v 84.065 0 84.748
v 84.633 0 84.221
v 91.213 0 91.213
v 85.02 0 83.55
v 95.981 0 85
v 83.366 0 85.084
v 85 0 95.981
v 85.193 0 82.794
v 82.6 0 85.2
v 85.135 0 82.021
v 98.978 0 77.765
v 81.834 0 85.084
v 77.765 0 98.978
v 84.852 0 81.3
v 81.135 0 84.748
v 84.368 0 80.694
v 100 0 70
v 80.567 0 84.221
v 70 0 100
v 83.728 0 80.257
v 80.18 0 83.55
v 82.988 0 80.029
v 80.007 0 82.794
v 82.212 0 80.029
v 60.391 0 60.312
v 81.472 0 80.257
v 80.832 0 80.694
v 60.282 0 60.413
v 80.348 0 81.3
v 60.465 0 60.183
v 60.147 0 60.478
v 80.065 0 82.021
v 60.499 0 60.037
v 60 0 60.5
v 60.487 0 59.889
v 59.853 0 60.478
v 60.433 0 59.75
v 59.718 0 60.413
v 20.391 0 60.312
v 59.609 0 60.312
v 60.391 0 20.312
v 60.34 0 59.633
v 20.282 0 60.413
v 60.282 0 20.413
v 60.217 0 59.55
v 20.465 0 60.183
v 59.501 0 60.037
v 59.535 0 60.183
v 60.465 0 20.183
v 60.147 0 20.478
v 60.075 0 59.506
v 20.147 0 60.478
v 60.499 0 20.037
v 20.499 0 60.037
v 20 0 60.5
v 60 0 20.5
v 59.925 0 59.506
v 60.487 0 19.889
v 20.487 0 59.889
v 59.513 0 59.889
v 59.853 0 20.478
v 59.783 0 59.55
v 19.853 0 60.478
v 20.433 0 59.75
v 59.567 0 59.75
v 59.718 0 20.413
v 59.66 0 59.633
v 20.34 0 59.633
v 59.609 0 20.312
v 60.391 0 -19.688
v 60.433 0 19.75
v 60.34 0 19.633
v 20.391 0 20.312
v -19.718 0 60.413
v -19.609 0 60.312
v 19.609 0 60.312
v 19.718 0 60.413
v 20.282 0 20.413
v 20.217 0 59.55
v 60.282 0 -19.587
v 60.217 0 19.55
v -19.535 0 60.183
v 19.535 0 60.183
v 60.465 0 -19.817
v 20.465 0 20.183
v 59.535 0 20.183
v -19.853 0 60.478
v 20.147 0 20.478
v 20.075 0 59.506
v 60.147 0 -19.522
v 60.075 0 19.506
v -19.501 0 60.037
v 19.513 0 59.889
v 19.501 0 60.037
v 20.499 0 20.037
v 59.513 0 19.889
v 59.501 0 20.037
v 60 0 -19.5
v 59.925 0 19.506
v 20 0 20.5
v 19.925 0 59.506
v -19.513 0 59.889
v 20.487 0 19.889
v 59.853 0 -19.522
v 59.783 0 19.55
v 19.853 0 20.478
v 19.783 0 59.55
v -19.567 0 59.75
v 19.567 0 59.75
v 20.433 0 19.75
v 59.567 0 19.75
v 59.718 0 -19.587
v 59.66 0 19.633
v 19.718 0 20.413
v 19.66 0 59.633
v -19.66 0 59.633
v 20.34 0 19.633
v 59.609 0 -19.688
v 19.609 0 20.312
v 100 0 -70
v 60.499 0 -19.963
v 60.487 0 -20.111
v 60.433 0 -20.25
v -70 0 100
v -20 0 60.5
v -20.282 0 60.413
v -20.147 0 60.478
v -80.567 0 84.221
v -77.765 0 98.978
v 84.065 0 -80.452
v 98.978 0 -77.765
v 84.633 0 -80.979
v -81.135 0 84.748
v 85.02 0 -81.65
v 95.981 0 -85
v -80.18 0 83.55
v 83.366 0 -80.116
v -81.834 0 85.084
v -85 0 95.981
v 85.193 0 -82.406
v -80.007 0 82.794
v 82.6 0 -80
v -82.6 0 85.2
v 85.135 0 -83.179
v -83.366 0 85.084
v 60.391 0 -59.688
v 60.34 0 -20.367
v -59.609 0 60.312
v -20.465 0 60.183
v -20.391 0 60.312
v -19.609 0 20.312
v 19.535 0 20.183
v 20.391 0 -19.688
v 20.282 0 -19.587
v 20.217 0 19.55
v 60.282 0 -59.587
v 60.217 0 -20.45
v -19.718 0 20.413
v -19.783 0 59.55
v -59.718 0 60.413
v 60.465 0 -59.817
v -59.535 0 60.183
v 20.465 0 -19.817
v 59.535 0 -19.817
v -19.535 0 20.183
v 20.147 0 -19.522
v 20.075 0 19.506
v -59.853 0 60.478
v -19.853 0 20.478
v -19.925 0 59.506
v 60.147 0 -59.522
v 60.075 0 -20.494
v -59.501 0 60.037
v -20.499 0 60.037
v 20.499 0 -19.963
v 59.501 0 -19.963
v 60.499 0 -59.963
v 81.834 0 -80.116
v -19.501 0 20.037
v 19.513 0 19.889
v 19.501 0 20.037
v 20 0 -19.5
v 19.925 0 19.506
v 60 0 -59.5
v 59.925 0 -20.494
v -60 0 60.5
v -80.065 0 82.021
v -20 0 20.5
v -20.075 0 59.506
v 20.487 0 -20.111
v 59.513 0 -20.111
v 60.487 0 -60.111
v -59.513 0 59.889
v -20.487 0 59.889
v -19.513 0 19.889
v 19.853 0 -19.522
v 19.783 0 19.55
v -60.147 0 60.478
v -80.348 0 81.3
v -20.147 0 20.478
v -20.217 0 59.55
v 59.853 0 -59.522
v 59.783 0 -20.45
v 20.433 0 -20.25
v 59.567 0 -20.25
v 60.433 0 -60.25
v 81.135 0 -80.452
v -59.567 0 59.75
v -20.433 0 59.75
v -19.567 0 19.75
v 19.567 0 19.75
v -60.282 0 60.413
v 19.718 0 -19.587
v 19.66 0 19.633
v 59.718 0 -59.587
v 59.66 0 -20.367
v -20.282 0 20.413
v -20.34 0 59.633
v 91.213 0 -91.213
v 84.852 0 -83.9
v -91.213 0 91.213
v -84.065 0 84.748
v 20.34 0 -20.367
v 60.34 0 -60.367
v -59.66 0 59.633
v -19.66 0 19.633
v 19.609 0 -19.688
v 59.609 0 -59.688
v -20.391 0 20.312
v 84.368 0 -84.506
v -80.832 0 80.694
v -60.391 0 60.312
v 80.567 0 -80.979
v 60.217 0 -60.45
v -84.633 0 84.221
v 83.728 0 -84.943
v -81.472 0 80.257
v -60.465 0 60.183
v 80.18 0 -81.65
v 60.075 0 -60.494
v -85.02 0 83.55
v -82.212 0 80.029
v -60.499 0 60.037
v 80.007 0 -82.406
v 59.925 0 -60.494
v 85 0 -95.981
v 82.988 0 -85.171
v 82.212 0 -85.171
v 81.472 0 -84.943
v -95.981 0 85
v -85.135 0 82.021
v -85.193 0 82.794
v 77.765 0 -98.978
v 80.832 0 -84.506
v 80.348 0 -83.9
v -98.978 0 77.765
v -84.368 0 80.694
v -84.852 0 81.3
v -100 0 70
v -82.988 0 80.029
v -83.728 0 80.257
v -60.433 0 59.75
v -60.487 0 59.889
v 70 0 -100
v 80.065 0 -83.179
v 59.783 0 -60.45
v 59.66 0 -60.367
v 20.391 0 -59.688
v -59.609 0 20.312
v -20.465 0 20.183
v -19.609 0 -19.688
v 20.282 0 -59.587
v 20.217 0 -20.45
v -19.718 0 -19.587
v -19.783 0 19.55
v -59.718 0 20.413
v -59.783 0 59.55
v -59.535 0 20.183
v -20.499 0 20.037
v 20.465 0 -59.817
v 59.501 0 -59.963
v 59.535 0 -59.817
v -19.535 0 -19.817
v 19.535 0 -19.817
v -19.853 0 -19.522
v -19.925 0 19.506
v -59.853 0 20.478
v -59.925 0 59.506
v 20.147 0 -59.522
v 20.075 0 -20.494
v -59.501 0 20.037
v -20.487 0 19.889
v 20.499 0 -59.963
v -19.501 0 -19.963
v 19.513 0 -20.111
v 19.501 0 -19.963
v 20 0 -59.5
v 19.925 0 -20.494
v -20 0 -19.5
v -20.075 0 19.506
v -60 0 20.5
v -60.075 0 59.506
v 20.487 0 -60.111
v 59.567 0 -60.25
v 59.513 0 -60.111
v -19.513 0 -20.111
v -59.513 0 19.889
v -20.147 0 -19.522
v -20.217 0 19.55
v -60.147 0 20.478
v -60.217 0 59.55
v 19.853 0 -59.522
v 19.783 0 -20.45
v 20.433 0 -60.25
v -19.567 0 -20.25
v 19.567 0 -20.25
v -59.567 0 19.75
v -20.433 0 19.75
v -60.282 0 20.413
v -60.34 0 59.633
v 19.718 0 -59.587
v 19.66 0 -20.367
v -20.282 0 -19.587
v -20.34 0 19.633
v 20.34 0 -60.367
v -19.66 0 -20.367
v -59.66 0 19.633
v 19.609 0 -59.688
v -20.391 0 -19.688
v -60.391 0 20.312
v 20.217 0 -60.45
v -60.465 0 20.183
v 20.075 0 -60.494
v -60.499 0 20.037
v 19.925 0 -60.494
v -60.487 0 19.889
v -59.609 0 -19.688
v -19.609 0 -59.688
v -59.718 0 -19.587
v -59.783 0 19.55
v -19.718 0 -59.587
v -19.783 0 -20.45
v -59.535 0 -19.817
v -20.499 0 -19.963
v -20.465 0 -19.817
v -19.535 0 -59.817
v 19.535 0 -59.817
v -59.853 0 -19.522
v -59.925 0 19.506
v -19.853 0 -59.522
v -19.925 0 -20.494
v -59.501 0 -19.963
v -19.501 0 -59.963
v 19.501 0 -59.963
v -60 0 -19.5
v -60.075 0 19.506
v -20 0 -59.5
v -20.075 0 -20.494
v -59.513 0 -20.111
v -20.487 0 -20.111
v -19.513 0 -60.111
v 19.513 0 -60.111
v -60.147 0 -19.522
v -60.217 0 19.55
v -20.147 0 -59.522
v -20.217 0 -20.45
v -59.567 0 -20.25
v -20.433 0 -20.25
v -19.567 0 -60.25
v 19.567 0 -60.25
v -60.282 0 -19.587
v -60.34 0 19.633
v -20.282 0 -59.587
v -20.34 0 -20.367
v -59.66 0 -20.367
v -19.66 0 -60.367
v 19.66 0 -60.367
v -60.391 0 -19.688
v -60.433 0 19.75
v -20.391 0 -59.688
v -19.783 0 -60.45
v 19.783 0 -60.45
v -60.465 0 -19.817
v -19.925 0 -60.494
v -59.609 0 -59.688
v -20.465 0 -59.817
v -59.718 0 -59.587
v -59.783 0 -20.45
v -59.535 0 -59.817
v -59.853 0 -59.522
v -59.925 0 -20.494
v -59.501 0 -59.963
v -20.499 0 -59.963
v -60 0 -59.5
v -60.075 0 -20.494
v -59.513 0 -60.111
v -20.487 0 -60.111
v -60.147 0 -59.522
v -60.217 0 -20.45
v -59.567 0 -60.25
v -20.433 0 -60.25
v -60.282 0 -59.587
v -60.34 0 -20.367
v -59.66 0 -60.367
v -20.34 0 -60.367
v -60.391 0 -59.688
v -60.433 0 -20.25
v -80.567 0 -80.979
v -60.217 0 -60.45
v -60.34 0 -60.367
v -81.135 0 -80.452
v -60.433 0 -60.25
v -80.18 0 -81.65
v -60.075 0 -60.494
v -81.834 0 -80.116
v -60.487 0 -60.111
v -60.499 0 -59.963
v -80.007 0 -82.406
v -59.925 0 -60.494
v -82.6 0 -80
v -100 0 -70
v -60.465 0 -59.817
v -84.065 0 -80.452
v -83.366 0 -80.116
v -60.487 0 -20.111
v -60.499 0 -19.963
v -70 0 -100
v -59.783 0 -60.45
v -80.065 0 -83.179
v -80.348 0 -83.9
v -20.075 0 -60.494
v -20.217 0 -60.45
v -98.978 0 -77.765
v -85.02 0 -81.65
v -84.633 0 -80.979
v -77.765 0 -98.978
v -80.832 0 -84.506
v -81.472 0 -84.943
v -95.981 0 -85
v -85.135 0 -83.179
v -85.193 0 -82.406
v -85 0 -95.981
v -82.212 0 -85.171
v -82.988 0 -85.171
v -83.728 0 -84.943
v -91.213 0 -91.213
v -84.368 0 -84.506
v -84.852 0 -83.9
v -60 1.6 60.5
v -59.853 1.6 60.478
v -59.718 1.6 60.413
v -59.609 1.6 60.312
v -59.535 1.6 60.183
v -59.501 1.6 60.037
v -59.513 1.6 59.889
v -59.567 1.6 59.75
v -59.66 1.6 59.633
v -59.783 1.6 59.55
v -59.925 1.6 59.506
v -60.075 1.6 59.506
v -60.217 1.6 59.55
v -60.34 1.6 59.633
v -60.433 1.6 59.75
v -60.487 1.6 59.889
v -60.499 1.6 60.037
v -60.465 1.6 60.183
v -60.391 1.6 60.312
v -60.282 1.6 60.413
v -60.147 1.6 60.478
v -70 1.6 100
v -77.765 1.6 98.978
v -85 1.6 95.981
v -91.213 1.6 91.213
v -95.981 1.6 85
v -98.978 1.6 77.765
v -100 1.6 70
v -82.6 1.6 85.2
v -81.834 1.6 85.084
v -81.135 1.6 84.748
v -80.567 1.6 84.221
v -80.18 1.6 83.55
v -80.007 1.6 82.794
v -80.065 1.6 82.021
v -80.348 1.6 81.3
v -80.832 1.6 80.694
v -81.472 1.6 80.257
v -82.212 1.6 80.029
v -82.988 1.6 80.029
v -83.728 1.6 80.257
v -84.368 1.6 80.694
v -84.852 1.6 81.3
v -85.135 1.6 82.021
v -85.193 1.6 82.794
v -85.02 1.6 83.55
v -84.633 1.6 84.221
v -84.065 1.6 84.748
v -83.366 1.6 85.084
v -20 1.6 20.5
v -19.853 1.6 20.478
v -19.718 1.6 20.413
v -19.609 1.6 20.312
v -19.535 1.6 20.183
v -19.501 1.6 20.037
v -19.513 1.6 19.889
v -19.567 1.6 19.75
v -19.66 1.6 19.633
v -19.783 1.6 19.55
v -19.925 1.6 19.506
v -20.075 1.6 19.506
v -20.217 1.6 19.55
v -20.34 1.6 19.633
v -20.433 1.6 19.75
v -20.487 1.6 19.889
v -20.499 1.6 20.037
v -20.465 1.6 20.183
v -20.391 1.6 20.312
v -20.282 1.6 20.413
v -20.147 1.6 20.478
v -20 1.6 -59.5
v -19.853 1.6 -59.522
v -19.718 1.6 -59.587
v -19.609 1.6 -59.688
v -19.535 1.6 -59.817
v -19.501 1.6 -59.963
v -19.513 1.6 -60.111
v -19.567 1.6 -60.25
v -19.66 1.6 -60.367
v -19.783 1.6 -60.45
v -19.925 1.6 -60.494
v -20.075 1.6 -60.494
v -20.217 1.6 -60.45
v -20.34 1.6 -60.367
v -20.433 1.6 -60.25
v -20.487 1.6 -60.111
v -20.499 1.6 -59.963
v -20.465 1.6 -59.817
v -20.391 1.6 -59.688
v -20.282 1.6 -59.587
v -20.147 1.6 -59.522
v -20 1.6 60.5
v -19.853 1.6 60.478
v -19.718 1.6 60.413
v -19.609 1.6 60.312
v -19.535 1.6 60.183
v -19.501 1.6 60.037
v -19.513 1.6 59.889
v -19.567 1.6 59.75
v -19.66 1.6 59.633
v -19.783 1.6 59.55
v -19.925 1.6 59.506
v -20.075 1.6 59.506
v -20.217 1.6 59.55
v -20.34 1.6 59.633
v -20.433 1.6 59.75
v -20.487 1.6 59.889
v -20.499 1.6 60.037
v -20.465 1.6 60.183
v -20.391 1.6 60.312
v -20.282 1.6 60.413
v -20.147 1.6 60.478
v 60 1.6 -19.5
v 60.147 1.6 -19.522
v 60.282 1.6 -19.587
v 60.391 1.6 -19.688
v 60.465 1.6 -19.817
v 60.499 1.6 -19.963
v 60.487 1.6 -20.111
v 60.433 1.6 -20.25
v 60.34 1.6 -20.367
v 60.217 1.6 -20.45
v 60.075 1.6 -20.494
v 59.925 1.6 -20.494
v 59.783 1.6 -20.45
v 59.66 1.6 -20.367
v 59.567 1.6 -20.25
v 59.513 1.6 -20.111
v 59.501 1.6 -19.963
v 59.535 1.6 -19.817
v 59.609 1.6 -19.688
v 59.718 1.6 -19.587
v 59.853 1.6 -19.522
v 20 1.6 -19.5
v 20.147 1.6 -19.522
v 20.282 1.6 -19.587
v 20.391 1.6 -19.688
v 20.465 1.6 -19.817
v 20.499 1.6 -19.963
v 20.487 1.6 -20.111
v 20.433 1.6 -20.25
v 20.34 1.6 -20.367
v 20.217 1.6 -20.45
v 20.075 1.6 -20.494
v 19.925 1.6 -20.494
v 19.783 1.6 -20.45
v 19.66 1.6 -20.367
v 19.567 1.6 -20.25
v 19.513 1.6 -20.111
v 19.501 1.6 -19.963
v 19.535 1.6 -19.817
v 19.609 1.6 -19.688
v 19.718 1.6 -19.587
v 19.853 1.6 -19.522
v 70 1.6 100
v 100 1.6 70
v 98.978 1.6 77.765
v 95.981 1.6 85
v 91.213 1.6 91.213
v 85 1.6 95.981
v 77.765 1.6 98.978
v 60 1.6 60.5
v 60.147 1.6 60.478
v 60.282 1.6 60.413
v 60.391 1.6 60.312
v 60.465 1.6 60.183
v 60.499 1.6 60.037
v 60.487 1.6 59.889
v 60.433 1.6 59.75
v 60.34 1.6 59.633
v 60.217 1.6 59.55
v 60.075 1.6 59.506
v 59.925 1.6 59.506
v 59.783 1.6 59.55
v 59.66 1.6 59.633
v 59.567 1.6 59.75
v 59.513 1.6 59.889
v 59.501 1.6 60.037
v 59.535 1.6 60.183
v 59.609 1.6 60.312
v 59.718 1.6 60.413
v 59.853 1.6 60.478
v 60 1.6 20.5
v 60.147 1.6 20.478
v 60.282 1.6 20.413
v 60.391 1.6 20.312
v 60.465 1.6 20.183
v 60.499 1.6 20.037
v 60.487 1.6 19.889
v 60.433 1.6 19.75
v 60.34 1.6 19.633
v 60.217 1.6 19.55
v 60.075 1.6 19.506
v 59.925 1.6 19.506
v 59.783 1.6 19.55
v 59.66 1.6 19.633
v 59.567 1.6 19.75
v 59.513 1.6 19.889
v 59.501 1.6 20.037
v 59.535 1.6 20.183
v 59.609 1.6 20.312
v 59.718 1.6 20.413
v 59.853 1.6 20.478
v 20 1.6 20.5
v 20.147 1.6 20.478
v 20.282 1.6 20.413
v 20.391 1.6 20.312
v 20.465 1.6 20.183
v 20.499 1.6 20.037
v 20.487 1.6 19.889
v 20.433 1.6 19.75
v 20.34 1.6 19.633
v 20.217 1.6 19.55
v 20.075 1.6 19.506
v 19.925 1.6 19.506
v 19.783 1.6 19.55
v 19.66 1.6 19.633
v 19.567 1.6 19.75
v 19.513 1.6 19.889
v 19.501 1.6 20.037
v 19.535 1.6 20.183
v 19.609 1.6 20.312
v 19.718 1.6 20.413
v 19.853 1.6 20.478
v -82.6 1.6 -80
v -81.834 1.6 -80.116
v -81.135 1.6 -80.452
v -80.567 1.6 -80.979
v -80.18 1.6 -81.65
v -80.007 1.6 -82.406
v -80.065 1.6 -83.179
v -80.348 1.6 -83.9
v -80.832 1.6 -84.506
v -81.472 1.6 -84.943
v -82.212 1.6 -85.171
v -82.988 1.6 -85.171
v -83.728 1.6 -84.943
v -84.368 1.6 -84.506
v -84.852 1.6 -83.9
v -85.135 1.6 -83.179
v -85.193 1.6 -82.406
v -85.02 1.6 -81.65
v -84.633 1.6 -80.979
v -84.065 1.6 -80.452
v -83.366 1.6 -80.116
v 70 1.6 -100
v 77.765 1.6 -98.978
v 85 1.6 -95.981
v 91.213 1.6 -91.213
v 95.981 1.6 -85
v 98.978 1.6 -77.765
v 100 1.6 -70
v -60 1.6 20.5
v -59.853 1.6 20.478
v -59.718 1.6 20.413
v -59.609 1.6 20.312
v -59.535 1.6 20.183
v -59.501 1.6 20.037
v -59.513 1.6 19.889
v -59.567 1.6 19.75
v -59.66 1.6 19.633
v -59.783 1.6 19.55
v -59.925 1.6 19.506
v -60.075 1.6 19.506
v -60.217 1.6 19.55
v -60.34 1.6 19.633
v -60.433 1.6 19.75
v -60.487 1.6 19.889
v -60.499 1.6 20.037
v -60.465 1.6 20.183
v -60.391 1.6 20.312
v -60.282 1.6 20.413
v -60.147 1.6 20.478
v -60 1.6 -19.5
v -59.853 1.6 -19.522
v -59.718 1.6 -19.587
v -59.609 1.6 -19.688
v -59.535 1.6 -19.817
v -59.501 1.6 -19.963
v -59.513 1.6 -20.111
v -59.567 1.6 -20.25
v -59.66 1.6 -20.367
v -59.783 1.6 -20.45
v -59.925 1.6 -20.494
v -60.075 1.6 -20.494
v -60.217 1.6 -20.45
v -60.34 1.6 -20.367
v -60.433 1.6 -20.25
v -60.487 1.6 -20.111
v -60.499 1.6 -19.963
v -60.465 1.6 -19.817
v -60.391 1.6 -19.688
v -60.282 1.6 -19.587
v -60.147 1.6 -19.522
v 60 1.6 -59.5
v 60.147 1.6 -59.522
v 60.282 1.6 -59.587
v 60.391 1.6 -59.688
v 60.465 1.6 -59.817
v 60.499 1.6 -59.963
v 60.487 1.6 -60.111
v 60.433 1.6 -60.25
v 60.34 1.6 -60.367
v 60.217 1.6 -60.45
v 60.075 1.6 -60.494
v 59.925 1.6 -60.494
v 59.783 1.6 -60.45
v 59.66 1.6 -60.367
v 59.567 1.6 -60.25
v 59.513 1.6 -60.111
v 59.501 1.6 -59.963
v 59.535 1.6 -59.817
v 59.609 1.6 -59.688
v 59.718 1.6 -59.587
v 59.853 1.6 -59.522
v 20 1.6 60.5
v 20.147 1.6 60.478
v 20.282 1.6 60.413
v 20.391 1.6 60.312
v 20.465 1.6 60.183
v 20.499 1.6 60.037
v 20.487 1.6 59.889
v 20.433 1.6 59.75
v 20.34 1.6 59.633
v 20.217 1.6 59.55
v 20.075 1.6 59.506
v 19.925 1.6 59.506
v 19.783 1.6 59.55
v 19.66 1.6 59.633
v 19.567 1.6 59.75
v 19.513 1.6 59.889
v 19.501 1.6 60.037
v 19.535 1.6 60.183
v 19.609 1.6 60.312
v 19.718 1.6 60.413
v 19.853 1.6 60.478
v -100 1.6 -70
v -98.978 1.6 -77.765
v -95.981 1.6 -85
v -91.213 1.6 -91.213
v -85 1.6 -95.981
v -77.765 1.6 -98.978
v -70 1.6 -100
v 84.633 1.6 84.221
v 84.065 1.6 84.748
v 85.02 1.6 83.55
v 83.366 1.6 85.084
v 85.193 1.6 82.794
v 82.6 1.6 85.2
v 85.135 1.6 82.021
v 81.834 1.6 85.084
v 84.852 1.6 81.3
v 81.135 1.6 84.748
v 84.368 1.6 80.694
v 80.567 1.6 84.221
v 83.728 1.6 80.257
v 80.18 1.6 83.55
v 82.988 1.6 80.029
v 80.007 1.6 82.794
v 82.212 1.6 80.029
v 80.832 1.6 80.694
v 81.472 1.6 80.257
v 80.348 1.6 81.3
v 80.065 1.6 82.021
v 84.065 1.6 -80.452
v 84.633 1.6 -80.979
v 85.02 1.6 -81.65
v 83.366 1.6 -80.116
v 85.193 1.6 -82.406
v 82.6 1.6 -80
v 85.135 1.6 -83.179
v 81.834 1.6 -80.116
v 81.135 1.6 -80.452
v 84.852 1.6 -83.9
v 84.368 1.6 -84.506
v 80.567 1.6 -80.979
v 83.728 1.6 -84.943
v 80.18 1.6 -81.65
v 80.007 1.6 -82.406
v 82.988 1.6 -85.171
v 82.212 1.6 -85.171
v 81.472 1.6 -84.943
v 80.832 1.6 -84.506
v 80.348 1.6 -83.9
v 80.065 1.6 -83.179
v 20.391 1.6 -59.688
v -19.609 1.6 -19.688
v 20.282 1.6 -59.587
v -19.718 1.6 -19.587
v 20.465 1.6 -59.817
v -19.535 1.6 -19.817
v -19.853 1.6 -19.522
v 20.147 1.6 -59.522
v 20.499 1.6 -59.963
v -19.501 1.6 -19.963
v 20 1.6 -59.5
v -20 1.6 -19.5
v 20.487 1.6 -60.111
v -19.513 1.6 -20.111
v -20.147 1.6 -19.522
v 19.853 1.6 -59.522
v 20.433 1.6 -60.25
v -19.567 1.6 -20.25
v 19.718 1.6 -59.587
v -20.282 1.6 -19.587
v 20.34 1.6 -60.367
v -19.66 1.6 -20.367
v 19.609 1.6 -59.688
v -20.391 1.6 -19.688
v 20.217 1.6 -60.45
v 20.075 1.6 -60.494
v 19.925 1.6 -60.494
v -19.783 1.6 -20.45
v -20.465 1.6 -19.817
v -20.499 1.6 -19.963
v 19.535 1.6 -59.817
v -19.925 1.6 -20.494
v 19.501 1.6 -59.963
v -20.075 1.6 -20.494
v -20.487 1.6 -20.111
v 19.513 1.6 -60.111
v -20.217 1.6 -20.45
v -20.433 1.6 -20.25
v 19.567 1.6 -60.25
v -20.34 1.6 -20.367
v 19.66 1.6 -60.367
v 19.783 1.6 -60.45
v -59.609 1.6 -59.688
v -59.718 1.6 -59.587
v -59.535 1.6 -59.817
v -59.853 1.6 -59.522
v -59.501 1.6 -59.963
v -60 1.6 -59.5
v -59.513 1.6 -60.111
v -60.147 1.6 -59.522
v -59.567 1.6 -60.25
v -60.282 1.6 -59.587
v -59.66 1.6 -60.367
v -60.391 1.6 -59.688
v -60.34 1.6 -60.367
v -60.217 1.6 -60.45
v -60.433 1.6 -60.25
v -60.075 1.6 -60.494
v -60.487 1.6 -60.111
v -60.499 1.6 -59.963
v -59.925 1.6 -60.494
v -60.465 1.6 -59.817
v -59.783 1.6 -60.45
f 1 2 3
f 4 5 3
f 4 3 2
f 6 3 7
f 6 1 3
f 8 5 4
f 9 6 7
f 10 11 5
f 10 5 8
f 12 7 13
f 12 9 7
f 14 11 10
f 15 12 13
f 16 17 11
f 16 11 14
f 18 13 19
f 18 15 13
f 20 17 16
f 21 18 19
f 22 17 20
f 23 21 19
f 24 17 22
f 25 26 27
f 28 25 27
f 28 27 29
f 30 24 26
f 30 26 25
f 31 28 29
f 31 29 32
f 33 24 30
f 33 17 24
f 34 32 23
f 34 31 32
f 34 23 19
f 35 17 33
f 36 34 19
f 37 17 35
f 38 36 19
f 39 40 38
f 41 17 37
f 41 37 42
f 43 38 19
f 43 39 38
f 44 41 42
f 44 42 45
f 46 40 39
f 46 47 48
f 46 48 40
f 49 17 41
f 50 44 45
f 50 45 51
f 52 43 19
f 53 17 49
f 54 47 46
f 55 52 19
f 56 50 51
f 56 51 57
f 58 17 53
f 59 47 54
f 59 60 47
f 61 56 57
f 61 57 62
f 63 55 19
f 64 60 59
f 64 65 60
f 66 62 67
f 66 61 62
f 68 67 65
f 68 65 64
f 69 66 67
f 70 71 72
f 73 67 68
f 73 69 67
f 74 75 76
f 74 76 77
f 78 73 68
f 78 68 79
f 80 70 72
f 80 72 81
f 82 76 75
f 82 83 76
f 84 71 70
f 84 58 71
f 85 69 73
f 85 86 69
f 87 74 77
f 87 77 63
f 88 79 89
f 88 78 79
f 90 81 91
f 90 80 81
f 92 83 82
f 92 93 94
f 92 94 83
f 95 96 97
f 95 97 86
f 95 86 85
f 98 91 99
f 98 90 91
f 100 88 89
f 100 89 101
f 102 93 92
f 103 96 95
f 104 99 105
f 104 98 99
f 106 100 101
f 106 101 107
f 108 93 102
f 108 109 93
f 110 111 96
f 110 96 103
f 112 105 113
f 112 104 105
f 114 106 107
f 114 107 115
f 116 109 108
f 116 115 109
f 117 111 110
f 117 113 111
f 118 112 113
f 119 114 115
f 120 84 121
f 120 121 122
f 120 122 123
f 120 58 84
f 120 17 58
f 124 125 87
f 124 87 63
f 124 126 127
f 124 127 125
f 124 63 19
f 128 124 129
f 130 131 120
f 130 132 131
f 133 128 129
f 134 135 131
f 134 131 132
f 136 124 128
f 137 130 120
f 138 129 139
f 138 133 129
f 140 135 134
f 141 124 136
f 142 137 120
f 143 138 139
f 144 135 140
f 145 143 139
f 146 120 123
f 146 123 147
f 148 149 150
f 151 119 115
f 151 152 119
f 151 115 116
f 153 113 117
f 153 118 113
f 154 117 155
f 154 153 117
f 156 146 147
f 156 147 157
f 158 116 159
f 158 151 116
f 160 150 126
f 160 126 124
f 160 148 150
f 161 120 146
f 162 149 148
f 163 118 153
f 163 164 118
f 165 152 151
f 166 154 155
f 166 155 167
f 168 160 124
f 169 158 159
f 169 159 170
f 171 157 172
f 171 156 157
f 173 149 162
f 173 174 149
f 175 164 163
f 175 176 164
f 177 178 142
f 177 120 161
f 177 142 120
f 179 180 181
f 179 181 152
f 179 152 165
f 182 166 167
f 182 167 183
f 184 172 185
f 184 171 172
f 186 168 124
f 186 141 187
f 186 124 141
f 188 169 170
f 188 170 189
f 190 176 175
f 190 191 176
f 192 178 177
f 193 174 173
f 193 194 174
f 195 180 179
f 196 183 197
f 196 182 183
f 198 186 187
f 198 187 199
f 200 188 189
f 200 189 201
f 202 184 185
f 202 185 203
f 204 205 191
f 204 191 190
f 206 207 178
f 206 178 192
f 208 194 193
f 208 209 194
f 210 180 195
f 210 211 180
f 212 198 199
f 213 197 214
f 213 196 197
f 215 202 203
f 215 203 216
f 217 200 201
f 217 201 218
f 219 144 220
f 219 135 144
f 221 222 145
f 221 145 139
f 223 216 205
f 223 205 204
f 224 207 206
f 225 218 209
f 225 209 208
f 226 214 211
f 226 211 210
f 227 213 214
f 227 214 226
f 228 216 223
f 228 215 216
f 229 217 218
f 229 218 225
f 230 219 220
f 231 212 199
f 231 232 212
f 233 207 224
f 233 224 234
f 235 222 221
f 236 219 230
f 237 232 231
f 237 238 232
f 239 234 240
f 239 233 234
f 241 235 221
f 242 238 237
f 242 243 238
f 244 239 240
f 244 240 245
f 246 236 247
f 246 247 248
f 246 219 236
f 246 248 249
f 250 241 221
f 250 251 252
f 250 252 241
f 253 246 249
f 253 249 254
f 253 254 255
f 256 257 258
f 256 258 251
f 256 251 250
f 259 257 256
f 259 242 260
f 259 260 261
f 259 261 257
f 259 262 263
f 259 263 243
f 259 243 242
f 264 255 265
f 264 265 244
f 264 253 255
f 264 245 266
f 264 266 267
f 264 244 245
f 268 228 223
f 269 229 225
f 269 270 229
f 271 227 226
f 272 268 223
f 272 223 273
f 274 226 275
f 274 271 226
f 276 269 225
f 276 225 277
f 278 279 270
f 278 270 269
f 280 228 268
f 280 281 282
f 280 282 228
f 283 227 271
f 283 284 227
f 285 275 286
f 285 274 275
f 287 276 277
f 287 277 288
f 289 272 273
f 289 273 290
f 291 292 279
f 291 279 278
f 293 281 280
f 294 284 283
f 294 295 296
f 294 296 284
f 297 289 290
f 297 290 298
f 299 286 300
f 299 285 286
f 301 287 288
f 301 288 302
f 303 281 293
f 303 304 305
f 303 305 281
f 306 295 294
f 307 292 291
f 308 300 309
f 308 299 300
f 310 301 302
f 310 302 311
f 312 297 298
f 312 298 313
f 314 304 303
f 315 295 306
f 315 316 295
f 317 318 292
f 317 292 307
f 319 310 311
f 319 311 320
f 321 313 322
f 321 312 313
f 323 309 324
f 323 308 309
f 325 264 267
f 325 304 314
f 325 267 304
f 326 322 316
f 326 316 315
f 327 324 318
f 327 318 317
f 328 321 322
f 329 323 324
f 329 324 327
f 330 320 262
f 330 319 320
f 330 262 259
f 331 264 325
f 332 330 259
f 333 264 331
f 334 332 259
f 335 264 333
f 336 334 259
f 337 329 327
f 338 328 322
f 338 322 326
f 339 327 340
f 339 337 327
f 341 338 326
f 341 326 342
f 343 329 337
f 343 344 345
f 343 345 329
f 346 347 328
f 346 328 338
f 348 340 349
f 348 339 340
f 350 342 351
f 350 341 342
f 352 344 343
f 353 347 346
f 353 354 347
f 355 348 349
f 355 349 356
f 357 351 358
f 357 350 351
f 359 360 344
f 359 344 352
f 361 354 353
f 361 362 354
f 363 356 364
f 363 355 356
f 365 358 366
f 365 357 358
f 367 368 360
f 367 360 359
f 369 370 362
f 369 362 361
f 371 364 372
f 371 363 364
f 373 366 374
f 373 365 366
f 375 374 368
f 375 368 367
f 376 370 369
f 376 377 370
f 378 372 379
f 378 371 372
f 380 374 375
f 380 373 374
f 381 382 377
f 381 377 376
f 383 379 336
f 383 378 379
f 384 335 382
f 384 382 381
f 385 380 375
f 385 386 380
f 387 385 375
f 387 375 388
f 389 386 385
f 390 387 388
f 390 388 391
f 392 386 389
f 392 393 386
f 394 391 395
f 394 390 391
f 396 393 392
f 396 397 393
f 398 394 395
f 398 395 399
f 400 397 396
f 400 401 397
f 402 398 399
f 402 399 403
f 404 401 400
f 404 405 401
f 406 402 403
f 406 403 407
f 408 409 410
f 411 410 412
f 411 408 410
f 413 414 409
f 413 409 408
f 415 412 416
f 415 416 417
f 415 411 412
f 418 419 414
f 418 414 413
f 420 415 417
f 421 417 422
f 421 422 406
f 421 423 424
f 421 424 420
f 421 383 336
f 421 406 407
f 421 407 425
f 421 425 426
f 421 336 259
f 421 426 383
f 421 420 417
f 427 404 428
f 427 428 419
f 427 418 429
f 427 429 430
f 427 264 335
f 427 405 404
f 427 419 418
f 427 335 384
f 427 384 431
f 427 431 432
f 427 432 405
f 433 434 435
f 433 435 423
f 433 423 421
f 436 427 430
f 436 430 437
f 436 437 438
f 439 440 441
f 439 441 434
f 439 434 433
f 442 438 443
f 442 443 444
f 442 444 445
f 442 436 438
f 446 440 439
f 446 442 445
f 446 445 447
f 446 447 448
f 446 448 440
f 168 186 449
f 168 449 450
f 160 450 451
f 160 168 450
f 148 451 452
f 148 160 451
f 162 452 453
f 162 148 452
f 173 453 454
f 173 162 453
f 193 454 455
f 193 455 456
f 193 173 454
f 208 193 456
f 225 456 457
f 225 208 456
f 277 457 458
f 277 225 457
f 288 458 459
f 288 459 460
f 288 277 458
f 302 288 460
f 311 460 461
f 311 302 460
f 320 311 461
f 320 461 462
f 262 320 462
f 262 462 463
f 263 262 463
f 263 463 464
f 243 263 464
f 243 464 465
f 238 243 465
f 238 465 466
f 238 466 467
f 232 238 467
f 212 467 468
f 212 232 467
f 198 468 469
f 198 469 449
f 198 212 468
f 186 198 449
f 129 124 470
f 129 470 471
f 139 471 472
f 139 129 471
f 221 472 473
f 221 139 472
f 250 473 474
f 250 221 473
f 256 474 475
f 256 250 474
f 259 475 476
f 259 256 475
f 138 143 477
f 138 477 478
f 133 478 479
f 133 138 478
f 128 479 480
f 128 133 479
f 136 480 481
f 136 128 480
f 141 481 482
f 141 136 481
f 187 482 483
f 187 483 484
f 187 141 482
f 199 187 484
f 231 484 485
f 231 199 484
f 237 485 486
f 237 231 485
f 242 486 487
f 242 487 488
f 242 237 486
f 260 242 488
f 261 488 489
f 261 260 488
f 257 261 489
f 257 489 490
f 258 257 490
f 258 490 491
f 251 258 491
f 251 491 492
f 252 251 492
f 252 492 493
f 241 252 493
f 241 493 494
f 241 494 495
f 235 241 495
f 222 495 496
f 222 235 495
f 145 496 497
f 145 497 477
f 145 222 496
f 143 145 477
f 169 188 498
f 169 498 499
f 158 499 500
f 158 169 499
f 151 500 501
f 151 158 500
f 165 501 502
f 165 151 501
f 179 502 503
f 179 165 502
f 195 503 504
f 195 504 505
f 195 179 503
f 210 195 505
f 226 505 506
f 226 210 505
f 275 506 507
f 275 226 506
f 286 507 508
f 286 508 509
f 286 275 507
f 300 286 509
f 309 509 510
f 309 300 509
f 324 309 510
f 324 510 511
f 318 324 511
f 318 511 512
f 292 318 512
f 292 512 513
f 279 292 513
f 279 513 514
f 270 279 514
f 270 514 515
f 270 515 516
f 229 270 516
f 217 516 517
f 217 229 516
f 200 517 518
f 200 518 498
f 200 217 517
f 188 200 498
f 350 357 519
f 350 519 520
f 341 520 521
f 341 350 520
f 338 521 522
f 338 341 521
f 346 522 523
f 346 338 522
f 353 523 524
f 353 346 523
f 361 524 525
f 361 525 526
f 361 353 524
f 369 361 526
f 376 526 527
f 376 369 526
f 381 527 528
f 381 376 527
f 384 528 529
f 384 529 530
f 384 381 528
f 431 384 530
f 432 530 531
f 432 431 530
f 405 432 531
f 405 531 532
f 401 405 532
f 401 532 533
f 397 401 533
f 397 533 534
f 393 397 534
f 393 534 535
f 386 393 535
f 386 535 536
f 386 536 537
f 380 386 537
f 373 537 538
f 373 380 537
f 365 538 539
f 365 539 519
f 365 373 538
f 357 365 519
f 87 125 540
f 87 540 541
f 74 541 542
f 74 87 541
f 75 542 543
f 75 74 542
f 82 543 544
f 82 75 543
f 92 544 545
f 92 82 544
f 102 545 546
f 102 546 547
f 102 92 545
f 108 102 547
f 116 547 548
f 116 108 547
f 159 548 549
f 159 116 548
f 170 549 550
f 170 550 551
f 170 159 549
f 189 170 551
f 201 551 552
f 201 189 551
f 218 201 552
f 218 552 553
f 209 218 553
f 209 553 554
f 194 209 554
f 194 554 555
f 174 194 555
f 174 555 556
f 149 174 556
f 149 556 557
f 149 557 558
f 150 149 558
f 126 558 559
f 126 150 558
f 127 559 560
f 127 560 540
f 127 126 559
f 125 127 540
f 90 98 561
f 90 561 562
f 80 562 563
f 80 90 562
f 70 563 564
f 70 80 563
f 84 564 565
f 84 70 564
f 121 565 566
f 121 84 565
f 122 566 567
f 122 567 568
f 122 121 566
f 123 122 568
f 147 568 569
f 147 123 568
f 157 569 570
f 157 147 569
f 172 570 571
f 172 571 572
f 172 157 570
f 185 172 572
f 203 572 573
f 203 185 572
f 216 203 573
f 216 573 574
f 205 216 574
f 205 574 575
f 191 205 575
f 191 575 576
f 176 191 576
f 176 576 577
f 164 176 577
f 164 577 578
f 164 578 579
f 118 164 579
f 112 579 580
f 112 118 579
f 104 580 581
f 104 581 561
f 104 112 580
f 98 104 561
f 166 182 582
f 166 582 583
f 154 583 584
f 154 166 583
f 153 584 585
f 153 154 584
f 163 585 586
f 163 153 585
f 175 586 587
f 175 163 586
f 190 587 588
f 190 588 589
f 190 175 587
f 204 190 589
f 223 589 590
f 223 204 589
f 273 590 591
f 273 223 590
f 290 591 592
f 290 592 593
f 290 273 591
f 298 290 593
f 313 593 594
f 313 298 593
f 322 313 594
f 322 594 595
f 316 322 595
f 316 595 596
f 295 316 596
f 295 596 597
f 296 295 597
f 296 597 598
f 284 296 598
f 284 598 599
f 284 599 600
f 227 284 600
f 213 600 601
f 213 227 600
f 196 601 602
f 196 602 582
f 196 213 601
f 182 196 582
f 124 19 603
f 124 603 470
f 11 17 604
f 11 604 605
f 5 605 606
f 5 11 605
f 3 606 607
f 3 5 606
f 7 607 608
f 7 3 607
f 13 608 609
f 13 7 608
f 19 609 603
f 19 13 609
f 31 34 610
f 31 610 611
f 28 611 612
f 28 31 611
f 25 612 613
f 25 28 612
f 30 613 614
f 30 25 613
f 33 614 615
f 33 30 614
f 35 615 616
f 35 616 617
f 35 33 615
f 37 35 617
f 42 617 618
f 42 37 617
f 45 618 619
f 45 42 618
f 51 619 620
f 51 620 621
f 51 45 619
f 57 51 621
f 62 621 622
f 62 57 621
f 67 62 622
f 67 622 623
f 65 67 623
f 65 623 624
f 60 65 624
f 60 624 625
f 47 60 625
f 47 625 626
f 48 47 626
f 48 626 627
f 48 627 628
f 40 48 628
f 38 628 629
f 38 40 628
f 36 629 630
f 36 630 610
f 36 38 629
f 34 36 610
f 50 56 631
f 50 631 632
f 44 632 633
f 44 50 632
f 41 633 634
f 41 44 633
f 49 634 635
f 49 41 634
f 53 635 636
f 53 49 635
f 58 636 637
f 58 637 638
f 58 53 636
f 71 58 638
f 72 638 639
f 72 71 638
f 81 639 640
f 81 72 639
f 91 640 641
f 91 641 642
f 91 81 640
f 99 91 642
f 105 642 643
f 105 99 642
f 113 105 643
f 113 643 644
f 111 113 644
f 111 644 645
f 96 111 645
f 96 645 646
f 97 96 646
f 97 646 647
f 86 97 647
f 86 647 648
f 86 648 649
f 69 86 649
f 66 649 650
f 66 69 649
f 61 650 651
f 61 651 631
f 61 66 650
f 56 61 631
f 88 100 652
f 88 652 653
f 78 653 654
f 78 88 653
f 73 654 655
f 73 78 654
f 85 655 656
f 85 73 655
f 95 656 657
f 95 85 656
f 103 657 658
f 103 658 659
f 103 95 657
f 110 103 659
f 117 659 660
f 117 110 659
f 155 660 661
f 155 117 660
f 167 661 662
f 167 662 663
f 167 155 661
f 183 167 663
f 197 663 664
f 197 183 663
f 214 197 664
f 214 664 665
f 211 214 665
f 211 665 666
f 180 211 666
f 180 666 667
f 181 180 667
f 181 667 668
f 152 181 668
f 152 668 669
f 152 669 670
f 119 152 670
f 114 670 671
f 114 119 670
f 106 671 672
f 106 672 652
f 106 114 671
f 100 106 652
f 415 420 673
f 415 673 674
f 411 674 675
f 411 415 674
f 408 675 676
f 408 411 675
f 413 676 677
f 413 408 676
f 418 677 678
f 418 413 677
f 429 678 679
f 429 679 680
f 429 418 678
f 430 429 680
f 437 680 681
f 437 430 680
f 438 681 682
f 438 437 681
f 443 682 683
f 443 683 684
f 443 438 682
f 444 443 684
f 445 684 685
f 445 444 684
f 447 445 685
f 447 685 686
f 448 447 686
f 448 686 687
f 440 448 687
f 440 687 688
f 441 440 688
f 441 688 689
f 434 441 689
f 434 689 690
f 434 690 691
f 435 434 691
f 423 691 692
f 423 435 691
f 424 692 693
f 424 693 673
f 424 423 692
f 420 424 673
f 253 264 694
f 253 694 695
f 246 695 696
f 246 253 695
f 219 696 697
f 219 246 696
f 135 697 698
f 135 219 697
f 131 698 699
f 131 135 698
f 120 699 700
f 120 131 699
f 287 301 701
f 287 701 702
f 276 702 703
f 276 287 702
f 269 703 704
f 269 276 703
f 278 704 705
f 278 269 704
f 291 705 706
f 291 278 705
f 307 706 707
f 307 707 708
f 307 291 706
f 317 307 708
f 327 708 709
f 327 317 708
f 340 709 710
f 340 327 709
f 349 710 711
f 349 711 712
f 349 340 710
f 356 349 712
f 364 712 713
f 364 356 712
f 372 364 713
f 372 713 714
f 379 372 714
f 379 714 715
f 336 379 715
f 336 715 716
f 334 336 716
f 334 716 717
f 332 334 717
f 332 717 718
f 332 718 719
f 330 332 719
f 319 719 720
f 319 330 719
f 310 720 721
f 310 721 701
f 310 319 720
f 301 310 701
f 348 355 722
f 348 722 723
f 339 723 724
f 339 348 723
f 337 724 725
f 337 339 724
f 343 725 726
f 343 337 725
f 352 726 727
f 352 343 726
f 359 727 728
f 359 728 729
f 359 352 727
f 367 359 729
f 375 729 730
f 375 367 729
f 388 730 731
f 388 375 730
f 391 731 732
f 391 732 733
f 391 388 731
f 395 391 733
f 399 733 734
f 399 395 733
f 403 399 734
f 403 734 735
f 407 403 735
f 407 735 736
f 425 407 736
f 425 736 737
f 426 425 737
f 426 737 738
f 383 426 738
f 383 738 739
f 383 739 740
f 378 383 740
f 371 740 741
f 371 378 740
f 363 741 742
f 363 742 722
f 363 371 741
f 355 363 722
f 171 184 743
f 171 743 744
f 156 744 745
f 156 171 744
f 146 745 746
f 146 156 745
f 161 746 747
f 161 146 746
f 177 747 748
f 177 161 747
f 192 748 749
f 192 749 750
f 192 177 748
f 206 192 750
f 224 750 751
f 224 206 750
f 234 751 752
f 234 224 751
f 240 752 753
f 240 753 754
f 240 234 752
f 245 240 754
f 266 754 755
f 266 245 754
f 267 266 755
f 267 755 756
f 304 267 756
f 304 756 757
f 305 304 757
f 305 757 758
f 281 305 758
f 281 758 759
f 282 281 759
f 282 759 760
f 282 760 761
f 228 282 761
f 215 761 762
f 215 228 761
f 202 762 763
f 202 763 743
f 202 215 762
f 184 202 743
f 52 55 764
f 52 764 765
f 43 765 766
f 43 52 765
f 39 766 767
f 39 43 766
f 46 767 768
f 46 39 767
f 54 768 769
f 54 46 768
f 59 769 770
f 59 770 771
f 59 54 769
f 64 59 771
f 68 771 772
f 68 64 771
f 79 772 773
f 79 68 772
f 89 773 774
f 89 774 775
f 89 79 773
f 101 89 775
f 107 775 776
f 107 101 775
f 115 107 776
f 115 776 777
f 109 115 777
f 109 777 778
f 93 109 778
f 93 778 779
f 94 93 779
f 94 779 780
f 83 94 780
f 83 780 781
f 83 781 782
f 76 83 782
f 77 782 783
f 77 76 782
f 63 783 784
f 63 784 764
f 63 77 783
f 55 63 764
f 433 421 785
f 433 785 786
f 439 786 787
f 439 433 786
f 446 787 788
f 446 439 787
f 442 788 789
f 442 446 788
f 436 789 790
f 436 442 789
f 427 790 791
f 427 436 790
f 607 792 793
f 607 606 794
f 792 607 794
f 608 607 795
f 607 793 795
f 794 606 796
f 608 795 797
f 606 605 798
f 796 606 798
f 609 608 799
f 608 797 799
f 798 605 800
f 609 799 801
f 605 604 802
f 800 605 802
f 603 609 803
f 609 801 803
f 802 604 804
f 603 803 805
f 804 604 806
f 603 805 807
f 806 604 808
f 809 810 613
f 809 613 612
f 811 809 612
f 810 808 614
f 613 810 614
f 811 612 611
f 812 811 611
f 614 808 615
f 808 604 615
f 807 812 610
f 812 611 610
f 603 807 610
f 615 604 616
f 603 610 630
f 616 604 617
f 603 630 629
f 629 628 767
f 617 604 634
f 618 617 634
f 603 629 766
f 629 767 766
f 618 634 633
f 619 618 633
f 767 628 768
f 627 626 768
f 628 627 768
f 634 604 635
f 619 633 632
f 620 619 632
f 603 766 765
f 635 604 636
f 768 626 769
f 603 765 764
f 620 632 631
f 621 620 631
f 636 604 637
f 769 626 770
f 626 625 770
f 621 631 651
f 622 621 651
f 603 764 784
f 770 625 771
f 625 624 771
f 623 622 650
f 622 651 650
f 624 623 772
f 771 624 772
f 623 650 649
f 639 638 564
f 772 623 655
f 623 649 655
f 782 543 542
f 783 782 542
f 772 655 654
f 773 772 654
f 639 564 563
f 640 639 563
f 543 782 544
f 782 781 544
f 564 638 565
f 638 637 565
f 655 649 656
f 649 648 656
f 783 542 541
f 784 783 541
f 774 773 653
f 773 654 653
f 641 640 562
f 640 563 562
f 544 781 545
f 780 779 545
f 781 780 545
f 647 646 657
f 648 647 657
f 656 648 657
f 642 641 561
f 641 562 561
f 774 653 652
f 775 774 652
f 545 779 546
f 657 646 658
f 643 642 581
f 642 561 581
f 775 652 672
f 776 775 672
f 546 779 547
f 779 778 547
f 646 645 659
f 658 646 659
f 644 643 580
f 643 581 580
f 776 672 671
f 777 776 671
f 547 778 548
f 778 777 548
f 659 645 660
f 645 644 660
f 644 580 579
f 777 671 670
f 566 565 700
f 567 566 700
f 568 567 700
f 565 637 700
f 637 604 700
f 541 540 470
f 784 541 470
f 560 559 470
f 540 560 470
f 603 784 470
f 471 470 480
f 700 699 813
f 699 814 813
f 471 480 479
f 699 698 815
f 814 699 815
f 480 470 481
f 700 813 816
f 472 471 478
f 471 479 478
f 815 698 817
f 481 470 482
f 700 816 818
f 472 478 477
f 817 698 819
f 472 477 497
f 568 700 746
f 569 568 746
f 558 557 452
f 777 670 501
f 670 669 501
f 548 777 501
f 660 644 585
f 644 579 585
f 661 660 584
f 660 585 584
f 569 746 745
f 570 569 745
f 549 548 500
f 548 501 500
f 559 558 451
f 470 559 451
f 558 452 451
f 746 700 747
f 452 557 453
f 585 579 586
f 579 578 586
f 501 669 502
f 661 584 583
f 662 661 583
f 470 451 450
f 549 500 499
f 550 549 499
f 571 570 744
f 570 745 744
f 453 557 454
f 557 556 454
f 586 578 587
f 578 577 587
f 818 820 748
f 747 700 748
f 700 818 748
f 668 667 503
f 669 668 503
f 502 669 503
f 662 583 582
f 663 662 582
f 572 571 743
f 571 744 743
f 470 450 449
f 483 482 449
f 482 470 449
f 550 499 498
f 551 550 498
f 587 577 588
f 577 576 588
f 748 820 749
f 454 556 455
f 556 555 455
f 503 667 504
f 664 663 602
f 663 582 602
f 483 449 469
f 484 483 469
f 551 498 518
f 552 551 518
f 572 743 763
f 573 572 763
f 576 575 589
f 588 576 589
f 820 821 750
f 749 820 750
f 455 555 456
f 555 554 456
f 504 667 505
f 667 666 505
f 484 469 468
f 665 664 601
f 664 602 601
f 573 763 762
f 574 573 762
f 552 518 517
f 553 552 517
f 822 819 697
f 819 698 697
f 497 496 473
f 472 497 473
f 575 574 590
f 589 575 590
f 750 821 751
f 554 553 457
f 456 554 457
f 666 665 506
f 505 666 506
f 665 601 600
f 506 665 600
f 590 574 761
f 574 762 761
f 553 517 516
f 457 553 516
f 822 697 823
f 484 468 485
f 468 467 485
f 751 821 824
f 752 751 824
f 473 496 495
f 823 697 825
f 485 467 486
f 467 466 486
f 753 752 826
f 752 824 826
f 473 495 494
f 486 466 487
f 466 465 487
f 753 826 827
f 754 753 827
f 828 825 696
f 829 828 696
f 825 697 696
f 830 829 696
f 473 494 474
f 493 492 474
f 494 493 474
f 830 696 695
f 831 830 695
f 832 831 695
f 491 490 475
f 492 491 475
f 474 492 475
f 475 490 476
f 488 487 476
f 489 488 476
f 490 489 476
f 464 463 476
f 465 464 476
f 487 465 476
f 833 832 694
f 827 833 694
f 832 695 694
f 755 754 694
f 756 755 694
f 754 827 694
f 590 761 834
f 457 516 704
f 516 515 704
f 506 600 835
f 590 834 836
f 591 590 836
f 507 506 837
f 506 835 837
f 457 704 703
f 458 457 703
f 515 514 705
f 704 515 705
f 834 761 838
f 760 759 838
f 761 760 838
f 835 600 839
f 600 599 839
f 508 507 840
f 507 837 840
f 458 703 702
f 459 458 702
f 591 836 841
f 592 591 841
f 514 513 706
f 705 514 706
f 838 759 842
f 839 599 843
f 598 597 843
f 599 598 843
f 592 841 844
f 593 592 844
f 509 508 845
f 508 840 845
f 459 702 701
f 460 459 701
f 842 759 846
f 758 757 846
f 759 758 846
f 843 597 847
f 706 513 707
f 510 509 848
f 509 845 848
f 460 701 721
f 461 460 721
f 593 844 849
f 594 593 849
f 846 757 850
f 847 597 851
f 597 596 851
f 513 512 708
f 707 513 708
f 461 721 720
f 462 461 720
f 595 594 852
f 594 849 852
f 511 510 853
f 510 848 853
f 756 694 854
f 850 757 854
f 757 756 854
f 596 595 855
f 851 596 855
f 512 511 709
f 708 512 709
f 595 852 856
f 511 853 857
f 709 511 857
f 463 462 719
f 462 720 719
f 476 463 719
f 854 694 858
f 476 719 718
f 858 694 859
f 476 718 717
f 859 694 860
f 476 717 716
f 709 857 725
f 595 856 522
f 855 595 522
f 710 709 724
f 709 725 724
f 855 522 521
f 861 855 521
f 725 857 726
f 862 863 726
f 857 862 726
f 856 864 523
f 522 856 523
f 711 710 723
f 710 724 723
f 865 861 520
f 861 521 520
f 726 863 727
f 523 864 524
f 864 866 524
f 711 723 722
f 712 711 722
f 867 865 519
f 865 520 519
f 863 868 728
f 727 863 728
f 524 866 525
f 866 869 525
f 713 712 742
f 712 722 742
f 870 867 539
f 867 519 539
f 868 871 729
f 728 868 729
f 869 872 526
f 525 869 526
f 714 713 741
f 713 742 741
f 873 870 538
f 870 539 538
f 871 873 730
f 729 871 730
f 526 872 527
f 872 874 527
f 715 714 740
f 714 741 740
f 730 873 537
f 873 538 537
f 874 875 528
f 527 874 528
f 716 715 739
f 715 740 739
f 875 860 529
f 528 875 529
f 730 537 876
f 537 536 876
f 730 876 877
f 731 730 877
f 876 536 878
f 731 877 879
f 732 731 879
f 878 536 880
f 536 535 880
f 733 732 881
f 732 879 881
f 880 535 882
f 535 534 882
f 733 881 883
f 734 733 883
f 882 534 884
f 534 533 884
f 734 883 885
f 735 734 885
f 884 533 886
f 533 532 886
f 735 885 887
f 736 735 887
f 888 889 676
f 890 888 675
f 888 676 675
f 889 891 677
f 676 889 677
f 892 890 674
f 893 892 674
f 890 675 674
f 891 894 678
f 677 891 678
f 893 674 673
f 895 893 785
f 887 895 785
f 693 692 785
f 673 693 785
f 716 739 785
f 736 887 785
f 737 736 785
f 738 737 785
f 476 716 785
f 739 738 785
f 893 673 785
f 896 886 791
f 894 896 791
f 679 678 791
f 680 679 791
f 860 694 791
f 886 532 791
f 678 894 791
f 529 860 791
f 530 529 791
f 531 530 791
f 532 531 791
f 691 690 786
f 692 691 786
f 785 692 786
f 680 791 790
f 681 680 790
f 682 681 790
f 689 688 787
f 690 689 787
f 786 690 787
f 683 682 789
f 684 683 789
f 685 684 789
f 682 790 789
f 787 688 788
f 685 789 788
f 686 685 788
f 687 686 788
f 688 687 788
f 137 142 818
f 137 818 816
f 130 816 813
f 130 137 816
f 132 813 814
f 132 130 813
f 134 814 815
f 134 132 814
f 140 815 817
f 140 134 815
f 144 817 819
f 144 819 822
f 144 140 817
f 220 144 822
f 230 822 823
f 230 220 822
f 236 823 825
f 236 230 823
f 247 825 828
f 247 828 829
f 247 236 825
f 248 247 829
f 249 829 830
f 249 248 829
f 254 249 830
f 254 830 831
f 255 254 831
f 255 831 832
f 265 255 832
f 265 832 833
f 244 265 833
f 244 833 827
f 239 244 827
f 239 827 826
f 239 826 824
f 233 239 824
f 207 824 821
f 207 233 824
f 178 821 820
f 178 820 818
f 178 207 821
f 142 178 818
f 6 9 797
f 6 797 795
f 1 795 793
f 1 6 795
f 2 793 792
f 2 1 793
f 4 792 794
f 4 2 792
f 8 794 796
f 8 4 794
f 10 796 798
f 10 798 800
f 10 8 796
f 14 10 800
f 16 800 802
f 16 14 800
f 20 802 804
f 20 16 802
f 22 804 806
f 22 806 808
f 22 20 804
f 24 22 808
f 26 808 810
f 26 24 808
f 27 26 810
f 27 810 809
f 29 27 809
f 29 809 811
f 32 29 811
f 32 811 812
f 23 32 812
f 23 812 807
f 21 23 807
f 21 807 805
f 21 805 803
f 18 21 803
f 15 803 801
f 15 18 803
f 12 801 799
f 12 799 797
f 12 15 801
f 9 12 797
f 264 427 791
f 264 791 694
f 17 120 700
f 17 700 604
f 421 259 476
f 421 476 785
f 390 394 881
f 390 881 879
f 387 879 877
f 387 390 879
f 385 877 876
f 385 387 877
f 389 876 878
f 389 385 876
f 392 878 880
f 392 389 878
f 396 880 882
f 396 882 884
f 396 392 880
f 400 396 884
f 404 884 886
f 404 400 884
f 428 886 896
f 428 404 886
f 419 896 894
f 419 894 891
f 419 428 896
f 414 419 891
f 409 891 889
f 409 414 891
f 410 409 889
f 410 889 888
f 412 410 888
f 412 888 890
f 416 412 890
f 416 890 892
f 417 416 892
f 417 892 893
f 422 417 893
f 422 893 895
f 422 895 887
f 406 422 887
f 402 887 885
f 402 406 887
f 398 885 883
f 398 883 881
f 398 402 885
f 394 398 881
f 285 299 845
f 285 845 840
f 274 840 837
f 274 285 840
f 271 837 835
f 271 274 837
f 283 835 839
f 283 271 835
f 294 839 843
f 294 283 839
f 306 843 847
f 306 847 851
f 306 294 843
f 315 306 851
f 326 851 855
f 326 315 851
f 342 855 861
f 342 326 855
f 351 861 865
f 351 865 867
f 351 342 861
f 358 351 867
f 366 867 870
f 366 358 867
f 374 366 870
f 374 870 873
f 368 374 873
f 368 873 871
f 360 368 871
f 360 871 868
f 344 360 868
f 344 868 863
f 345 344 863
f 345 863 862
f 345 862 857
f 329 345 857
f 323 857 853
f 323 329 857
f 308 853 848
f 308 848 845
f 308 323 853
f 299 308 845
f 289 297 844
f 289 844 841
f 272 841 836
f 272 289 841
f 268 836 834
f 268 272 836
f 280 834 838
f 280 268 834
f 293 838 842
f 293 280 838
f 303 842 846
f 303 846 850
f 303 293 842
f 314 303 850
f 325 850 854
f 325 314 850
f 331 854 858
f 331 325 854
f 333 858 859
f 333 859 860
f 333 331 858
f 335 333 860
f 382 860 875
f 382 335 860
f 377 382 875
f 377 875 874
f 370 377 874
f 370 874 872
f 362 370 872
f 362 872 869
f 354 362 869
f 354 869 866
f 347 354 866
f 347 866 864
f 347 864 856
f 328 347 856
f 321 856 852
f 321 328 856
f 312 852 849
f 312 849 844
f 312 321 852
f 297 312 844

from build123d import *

# Parameters (mm, degrees)
SKETCH1_R           = 2.6
SKETCH1_R_2         = 0.5
BOSS_EXTRUDE1_DEPTH = 1.6


with BuildPart() as part:
    # Sketch1 → Boss-Extrude1 (new body)
    with BuildSketch(Plane(origin=(0, 0, 0), x_dir=(1, 0, 0), z_dir=(0, 1, 0))):
        with BuildLine():
            Line((70, -100), (-70, -100))
            ThreePointArc((-70, -100), (-91.213203436, -91.213203436), (-100, -70))
            Line((-100, -70), (-100, 70))
            ThreePointArc((-100, 70), (-91.213203436, 91.213203436), (-70, 100))
            Line((-70, 100), (70, 100))
            ThreePointArc((70, 100), (91.213203436, 91.213203436), (100, 70))
            Line((100, 70), (100, -70))
            ThreePointArc((100, -70), (91.213203436, -91.213203436), (70, -100))
        make_face()
        with Locations(Location((-82.6, 82.6, 0), (0, 0, 270))):
            Circle(SKETCH1_R, mode=Mode.SUBTRACT)
        with Locations(Location((82.6, 82.6, 0), (0, 0, 270))):
            Circle(SKETCH1_R, mode=Mode.SUBTRACT)
        with Locations(Location((82.6, -82.6, 0), (0, 0, 270))):
            Circle(SKETCH1_R, mode=Mode.SUBTRACT)
        with Locations(Location((-82.6, -82.6, 0), (0, 0, 270))):
            Circle(SKETCH1_R, mode=Mode.SUBTRACT)
        with Locations(Location((-60, 60, 0), (0, 0, 270))):
            Circle(SKETCH1_R_2, mode=Mode.SUBTRACT)
        with Locations(Location((-20, 60, 0), (0, 0, 270))):
            Circle(SKETCH1_R_2, mode=Mode.SUBTRACT)
        with Locations(Location((-20, 20, 0), (0, 0, 270))):
            Circle(SKETCH1_R_2, mode=Mode.SUBTRACT)
        with Locations(Location((-60, 20, 0), (0, 0, 270))):
            Circle(SKETCH1_R_2, mode=Mode.SUBTRACT)
        with Locations(Location((60, 20, 0), (0, 0, 270))):
            Circle(SKETCH1_R_2, mode=Mode.SUBTRACT)
        with Locations(Location((20, 20, 0), (0, 0, 270))):
            Circle(SKETCH1_R_2, mode=Mode.SUBTRACT)
        with Locations(Location((20, 60, 0), (0, 0, 270))):
            Circle(SKETCH1_R_2, mode=Mode.SUBTRACT)
        with Locations(Location((60, 60, 0), (0, 0, 270))):
            Circle(SKETCH1_R_2, mode=Mode.SUBTRACT)
        with Locations(Location((20, -20, 0), (0, 0, 270))):
            Circle(SKETCH1_R_2, mode=Mode.SUBTRACT)
        with Locations(Location((60, -20, 0), (0, 0, 270))):
            Circle(SKETCH1_R_2, mode=Mode.SUBTRACT)
        with Locations(Location((60, -60, 0), (0, 0, 270))):
            Circle(SKETCH1_R_2, mode=Mode.SUBTRACT)
        with Locations(Location((20, -60, 0), (0, 0, 270))):
            Circle(SKETCH1_R_2, mode=Mode.SUBTRACT)
        with Locations(Location((-20, -20, 0), (0, 0, 270))):
            Circle(SKETCH1_R_2, mode=Mode.SUBTRACT)
        with Locations(Location((-60, -20, 0), (0, 0, 270))):
            Circle(SKETCH1_R_2, mode=Mode.SUBTRACT)
        with Locations(Location((-20, -60, 0), (0, 0, 270))):
            Circle(SKETCH1_R_2, mode=Mode.SUBTRACT)
        with Locations(Location((-60, -60, 0), (0, 0, 270))):
            Circle(SKETCH1_R_2, mode=Mode.SUBTRACT)
    extrude(amount=BOSS_EXTRUDE1_DEPTH)


solid = part.part
